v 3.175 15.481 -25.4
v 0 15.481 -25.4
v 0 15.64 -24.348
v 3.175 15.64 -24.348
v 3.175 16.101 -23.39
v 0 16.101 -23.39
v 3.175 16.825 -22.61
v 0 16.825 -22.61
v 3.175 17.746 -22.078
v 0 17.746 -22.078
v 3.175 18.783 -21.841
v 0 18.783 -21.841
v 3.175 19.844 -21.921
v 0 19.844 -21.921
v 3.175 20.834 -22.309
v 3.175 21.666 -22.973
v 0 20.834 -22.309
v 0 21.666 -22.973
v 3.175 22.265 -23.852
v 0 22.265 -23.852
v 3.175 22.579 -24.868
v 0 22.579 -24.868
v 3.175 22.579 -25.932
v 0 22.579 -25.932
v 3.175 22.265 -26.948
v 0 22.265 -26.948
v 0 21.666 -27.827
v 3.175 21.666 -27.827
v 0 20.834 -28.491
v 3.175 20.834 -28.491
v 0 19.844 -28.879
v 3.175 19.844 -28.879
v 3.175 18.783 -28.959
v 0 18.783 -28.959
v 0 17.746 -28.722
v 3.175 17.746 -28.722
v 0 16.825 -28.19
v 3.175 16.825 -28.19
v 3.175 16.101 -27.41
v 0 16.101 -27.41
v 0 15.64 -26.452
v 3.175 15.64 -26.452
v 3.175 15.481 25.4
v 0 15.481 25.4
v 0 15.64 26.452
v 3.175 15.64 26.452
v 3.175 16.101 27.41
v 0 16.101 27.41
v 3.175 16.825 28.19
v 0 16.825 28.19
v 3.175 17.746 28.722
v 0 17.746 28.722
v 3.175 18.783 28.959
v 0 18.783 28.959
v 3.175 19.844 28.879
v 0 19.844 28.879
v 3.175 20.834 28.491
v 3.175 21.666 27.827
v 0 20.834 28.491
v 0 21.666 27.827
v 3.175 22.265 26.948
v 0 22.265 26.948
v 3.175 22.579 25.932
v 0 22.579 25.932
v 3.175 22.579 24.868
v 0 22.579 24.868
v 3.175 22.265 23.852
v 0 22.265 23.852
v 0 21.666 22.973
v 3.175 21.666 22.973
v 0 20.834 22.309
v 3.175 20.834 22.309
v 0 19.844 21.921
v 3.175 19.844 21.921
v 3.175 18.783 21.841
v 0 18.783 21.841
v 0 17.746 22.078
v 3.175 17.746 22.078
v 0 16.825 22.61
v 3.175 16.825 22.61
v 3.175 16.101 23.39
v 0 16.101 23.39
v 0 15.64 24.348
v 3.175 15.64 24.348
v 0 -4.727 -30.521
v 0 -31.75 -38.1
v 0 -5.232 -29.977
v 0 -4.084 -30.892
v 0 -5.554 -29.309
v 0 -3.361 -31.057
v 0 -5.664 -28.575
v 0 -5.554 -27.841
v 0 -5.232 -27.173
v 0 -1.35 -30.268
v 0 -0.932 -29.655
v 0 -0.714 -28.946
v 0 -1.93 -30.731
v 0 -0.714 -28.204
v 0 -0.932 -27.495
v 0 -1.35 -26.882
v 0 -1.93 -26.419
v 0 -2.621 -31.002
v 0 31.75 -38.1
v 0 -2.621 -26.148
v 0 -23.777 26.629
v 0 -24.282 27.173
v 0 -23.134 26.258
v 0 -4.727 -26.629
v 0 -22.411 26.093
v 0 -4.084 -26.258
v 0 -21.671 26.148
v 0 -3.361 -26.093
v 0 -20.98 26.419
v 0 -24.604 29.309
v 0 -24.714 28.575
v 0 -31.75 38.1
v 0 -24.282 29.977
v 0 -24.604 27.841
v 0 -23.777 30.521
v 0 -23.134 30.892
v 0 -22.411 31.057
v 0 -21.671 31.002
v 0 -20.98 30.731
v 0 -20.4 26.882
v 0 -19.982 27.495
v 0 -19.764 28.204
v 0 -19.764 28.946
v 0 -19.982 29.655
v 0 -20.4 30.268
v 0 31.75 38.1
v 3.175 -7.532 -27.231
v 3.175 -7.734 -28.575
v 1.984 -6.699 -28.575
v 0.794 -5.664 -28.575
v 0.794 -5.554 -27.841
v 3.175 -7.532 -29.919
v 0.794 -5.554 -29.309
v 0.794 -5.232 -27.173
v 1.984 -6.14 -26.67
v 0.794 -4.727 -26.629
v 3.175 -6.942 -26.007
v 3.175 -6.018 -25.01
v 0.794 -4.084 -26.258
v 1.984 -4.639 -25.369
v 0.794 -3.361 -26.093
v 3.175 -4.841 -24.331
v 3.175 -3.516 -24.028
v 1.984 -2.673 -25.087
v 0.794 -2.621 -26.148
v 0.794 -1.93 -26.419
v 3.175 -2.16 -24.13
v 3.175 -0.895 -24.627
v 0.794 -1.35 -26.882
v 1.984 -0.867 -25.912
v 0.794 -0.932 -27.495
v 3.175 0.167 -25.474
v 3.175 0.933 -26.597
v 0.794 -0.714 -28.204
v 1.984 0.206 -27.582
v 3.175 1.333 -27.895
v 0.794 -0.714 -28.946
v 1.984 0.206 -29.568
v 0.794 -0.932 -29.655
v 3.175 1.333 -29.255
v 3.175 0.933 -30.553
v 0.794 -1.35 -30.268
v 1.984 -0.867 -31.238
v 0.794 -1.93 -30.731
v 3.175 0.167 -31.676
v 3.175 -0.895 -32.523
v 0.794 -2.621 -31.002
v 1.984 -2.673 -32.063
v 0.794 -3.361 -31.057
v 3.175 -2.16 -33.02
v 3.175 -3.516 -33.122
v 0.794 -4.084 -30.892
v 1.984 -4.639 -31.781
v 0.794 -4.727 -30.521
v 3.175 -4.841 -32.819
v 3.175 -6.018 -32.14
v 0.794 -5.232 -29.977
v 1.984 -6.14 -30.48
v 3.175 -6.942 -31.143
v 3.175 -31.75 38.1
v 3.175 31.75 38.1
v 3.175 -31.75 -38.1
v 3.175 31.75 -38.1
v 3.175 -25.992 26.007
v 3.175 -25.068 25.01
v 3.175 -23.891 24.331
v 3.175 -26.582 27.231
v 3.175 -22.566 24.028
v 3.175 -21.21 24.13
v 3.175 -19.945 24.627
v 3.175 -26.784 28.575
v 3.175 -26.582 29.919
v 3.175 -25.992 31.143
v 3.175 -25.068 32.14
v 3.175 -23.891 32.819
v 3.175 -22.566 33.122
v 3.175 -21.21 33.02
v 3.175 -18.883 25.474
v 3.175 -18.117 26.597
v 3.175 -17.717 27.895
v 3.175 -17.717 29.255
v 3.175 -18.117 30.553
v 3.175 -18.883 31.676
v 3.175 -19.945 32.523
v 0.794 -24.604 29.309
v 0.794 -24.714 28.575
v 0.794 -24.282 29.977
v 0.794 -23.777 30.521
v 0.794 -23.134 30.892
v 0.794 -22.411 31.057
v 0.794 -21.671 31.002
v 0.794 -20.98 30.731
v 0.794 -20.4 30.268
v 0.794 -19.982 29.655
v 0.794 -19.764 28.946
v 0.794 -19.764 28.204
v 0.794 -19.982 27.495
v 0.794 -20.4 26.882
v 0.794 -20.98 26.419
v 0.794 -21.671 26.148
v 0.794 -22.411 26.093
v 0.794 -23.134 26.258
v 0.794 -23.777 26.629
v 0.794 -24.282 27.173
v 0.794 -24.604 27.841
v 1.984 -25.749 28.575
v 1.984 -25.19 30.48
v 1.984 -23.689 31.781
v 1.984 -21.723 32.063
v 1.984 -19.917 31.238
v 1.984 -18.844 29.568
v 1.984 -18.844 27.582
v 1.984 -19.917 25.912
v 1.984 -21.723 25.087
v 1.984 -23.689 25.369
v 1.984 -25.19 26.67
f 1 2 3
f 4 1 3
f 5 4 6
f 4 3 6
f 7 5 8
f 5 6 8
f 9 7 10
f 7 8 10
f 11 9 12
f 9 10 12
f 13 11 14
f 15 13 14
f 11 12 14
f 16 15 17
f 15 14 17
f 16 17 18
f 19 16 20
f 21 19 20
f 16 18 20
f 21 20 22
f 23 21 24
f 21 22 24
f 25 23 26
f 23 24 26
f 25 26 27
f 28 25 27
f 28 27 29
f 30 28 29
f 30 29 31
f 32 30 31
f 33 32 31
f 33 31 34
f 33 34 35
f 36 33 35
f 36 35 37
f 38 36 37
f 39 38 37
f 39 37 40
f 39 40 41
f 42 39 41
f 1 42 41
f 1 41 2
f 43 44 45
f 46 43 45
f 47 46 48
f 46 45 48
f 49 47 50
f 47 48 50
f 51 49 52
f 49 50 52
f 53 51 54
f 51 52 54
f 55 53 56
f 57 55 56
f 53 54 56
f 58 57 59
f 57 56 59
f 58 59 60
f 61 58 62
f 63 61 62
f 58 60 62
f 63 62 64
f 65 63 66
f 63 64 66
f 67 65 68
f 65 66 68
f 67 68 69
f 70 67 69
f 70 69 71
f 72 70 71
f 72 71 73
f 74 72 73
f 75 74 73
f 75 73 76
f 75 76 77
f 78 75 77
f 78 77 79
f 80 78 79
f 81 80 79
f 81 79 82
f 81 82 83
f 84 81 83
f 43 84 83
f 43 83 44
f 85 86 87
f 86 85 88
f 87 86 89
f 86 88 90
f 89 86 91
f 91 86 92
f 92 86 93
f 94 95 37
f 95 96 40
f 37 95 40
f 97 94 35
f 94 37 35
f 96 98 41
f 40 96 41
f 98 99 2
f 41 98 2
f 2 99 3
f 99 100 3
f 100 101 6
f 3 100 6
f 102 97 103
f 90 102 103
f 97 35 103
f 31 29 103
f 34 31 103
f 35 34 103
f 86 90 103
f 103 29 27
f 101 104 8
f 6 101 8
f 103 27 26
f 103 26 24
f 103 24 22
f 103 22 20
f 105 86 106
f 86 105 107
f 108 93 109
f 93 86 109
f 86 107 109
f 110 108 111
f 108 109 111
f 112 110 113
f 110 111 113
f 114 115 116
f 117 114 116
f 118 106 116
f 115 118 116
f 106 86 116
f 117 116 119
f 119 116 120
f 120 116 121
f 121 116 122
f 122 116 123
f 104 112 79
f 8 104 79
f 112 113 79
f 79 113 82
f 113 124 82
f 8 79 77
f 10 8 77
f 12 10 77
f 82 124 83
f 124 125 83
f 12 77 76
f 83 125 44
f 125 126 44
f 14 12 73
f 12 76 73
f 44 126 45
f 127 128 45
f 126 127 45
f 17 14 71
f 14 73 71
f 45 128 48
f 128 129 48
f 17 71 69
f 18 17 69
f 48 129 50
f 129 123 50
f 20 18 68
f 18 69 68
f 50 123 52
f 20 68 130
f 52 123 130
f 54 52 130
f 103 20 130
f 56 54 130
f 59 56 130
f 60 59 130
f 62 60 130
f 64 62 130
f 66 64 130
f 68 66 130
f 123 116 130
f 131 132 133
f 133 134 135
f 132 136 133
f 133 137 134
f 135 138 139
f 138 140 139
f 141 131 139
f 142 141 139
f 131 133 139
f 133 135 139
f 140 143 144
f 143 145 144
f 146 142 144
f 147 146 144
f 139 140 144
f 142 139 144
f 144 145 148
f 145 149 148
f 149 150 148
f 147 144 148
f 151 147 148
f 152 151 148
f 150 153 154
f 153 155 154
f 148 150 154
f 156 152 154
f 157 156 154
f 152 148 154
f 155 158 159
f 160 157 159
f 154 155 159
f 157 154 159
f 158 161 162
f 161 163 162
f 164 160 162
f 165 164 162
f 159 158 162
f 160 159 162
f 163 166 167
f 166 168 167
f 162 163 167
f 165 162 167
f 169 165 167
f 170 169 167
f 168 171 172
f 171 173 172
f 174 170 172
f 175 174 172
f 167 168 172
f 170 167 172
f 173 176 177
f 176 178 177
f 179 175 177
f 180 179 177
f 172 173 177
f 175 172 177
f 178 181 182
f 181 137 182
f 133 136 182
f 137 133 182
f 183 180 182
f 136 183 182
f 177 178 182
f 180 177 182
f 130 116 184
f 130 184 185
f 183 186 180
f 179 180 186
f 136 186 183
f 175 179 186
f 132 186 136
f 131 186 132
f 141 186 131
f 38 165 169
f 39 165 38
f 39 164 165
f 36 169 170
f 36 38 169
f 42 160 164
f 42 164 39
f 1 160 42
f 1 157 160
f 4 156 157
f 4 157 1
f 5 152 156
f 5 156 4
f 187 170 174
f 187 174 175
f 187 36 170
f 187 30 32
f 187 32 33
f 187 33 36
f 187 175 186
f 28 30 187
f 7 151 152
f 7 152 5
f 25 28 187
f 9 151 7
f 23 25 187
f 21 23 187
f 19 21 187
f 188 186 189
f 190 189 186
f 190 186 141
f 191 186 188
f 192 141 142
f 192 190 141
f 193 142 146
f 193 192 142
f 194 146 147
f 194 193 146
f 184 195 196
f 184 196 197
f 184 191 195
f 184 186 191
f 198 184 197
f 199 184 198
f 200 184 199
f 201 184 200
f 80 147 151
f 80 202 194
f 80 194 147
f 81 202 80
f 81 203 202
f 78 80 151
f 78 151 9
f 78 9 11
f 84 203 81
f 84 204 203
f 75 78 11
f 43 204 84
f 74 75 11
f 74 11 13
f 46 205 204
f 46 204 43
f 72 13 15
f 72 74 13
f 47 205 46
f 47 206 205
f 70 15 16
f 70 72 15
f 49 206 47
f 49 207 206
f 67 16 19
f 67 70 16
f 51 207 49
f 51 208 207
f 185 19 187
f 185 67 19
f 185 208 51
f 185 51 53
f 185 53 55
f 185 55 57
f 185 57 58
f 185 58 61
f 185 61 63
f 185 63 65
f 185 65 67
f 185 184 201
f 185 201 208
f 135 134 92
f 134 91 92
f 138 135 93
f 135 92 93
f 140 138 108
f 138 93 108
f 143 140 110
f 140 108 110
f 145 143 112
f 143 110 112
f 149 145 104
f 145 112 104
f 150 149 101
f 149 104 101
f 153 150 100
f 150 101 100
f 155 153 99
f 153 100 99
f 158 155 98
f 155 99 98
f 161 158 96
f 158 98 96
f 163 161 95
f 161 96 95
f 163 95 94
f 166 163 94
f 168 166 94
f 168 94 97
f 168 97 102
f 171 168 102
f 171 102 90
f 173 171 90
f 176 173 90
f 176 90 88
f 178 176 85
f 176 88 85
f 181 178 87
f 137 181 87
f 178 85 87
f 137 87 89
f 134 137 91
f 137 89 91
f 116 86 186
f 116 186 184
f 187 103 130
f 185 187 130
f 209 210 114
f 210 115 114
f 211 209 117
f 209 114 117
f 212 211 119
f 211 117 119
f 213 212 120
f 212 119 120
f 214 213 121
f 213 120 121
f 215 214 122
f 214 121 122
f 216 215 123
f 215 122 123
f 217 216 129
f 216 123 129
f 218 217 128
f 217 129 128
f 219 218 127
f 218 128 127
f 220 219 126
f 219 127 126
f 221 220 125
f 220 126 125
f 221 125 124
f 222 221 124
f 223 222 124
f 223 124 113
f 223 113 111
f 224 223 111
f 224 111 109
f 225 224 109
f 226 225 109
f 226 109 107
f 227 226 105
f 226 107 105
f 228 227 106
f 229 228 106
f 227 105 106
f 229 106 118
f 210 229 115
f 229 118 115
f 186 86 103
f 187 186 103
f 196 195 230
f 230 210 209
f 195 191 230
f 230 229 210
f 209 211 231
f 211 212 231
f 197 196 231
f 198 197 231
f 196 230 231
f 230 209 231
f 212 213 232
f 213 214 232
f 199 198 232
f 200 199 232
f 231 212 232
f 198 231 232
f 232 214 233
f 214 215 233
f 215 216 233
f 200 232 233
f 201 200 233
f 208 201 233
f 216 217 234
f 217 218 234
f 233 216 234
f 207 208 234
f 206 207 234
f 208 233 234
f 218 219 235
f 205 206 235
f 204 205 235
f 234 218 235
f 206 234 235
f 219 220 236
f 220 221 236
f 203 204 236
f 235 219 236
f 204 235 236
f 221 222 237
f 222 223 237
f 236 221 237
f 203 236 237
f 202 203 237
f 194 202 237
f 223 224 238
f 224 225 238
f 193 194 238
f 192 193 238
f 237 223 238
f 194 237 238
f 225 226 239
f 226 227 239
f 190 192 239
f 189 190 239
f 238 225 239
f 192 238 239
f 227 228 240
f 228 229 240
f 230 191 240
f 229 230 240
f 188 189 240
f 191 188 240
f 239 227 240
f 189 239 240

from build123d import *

# Parameters (mm, degrees)
F0_W           = 63.5
F0_H           = 76.2
F1_DEPTH       = 3.175
F3_D           = 4.9784
F3_CSINK_D     = 9.1186
F3_CSINK_ANGLE = 82
F5_D           = 7.1374


# Not quite as in the source:
# - a feature names something its author has since deleted; it is built from what else it names


with BuildPart() as f1:
    # F0 (on Right) → F1 (new body)
    with BuildSketch(Plane.YZ):
        Rectangle(F0_W, F0_H)
    extrude(amount=F1_DEPTH)

    # F3 (through all)
    with Locations(Plane.YZ.offset(3.175)):
        with Locations((-22.225, 28.575), (-3.175, -28.575)):
            CounterSinkHole(F3_D / 2, F3_CSINK_D / 2, counter_sink_angle=F3_CSINK_ANGLE)

    # F5 (through all)
    with Locations(Plane.YZ.offset(3.175)):
        with Locations((19.05, 25.4), (19.05, -25.4)):
            Hole(F5_D / 2)


solid = f1.part
